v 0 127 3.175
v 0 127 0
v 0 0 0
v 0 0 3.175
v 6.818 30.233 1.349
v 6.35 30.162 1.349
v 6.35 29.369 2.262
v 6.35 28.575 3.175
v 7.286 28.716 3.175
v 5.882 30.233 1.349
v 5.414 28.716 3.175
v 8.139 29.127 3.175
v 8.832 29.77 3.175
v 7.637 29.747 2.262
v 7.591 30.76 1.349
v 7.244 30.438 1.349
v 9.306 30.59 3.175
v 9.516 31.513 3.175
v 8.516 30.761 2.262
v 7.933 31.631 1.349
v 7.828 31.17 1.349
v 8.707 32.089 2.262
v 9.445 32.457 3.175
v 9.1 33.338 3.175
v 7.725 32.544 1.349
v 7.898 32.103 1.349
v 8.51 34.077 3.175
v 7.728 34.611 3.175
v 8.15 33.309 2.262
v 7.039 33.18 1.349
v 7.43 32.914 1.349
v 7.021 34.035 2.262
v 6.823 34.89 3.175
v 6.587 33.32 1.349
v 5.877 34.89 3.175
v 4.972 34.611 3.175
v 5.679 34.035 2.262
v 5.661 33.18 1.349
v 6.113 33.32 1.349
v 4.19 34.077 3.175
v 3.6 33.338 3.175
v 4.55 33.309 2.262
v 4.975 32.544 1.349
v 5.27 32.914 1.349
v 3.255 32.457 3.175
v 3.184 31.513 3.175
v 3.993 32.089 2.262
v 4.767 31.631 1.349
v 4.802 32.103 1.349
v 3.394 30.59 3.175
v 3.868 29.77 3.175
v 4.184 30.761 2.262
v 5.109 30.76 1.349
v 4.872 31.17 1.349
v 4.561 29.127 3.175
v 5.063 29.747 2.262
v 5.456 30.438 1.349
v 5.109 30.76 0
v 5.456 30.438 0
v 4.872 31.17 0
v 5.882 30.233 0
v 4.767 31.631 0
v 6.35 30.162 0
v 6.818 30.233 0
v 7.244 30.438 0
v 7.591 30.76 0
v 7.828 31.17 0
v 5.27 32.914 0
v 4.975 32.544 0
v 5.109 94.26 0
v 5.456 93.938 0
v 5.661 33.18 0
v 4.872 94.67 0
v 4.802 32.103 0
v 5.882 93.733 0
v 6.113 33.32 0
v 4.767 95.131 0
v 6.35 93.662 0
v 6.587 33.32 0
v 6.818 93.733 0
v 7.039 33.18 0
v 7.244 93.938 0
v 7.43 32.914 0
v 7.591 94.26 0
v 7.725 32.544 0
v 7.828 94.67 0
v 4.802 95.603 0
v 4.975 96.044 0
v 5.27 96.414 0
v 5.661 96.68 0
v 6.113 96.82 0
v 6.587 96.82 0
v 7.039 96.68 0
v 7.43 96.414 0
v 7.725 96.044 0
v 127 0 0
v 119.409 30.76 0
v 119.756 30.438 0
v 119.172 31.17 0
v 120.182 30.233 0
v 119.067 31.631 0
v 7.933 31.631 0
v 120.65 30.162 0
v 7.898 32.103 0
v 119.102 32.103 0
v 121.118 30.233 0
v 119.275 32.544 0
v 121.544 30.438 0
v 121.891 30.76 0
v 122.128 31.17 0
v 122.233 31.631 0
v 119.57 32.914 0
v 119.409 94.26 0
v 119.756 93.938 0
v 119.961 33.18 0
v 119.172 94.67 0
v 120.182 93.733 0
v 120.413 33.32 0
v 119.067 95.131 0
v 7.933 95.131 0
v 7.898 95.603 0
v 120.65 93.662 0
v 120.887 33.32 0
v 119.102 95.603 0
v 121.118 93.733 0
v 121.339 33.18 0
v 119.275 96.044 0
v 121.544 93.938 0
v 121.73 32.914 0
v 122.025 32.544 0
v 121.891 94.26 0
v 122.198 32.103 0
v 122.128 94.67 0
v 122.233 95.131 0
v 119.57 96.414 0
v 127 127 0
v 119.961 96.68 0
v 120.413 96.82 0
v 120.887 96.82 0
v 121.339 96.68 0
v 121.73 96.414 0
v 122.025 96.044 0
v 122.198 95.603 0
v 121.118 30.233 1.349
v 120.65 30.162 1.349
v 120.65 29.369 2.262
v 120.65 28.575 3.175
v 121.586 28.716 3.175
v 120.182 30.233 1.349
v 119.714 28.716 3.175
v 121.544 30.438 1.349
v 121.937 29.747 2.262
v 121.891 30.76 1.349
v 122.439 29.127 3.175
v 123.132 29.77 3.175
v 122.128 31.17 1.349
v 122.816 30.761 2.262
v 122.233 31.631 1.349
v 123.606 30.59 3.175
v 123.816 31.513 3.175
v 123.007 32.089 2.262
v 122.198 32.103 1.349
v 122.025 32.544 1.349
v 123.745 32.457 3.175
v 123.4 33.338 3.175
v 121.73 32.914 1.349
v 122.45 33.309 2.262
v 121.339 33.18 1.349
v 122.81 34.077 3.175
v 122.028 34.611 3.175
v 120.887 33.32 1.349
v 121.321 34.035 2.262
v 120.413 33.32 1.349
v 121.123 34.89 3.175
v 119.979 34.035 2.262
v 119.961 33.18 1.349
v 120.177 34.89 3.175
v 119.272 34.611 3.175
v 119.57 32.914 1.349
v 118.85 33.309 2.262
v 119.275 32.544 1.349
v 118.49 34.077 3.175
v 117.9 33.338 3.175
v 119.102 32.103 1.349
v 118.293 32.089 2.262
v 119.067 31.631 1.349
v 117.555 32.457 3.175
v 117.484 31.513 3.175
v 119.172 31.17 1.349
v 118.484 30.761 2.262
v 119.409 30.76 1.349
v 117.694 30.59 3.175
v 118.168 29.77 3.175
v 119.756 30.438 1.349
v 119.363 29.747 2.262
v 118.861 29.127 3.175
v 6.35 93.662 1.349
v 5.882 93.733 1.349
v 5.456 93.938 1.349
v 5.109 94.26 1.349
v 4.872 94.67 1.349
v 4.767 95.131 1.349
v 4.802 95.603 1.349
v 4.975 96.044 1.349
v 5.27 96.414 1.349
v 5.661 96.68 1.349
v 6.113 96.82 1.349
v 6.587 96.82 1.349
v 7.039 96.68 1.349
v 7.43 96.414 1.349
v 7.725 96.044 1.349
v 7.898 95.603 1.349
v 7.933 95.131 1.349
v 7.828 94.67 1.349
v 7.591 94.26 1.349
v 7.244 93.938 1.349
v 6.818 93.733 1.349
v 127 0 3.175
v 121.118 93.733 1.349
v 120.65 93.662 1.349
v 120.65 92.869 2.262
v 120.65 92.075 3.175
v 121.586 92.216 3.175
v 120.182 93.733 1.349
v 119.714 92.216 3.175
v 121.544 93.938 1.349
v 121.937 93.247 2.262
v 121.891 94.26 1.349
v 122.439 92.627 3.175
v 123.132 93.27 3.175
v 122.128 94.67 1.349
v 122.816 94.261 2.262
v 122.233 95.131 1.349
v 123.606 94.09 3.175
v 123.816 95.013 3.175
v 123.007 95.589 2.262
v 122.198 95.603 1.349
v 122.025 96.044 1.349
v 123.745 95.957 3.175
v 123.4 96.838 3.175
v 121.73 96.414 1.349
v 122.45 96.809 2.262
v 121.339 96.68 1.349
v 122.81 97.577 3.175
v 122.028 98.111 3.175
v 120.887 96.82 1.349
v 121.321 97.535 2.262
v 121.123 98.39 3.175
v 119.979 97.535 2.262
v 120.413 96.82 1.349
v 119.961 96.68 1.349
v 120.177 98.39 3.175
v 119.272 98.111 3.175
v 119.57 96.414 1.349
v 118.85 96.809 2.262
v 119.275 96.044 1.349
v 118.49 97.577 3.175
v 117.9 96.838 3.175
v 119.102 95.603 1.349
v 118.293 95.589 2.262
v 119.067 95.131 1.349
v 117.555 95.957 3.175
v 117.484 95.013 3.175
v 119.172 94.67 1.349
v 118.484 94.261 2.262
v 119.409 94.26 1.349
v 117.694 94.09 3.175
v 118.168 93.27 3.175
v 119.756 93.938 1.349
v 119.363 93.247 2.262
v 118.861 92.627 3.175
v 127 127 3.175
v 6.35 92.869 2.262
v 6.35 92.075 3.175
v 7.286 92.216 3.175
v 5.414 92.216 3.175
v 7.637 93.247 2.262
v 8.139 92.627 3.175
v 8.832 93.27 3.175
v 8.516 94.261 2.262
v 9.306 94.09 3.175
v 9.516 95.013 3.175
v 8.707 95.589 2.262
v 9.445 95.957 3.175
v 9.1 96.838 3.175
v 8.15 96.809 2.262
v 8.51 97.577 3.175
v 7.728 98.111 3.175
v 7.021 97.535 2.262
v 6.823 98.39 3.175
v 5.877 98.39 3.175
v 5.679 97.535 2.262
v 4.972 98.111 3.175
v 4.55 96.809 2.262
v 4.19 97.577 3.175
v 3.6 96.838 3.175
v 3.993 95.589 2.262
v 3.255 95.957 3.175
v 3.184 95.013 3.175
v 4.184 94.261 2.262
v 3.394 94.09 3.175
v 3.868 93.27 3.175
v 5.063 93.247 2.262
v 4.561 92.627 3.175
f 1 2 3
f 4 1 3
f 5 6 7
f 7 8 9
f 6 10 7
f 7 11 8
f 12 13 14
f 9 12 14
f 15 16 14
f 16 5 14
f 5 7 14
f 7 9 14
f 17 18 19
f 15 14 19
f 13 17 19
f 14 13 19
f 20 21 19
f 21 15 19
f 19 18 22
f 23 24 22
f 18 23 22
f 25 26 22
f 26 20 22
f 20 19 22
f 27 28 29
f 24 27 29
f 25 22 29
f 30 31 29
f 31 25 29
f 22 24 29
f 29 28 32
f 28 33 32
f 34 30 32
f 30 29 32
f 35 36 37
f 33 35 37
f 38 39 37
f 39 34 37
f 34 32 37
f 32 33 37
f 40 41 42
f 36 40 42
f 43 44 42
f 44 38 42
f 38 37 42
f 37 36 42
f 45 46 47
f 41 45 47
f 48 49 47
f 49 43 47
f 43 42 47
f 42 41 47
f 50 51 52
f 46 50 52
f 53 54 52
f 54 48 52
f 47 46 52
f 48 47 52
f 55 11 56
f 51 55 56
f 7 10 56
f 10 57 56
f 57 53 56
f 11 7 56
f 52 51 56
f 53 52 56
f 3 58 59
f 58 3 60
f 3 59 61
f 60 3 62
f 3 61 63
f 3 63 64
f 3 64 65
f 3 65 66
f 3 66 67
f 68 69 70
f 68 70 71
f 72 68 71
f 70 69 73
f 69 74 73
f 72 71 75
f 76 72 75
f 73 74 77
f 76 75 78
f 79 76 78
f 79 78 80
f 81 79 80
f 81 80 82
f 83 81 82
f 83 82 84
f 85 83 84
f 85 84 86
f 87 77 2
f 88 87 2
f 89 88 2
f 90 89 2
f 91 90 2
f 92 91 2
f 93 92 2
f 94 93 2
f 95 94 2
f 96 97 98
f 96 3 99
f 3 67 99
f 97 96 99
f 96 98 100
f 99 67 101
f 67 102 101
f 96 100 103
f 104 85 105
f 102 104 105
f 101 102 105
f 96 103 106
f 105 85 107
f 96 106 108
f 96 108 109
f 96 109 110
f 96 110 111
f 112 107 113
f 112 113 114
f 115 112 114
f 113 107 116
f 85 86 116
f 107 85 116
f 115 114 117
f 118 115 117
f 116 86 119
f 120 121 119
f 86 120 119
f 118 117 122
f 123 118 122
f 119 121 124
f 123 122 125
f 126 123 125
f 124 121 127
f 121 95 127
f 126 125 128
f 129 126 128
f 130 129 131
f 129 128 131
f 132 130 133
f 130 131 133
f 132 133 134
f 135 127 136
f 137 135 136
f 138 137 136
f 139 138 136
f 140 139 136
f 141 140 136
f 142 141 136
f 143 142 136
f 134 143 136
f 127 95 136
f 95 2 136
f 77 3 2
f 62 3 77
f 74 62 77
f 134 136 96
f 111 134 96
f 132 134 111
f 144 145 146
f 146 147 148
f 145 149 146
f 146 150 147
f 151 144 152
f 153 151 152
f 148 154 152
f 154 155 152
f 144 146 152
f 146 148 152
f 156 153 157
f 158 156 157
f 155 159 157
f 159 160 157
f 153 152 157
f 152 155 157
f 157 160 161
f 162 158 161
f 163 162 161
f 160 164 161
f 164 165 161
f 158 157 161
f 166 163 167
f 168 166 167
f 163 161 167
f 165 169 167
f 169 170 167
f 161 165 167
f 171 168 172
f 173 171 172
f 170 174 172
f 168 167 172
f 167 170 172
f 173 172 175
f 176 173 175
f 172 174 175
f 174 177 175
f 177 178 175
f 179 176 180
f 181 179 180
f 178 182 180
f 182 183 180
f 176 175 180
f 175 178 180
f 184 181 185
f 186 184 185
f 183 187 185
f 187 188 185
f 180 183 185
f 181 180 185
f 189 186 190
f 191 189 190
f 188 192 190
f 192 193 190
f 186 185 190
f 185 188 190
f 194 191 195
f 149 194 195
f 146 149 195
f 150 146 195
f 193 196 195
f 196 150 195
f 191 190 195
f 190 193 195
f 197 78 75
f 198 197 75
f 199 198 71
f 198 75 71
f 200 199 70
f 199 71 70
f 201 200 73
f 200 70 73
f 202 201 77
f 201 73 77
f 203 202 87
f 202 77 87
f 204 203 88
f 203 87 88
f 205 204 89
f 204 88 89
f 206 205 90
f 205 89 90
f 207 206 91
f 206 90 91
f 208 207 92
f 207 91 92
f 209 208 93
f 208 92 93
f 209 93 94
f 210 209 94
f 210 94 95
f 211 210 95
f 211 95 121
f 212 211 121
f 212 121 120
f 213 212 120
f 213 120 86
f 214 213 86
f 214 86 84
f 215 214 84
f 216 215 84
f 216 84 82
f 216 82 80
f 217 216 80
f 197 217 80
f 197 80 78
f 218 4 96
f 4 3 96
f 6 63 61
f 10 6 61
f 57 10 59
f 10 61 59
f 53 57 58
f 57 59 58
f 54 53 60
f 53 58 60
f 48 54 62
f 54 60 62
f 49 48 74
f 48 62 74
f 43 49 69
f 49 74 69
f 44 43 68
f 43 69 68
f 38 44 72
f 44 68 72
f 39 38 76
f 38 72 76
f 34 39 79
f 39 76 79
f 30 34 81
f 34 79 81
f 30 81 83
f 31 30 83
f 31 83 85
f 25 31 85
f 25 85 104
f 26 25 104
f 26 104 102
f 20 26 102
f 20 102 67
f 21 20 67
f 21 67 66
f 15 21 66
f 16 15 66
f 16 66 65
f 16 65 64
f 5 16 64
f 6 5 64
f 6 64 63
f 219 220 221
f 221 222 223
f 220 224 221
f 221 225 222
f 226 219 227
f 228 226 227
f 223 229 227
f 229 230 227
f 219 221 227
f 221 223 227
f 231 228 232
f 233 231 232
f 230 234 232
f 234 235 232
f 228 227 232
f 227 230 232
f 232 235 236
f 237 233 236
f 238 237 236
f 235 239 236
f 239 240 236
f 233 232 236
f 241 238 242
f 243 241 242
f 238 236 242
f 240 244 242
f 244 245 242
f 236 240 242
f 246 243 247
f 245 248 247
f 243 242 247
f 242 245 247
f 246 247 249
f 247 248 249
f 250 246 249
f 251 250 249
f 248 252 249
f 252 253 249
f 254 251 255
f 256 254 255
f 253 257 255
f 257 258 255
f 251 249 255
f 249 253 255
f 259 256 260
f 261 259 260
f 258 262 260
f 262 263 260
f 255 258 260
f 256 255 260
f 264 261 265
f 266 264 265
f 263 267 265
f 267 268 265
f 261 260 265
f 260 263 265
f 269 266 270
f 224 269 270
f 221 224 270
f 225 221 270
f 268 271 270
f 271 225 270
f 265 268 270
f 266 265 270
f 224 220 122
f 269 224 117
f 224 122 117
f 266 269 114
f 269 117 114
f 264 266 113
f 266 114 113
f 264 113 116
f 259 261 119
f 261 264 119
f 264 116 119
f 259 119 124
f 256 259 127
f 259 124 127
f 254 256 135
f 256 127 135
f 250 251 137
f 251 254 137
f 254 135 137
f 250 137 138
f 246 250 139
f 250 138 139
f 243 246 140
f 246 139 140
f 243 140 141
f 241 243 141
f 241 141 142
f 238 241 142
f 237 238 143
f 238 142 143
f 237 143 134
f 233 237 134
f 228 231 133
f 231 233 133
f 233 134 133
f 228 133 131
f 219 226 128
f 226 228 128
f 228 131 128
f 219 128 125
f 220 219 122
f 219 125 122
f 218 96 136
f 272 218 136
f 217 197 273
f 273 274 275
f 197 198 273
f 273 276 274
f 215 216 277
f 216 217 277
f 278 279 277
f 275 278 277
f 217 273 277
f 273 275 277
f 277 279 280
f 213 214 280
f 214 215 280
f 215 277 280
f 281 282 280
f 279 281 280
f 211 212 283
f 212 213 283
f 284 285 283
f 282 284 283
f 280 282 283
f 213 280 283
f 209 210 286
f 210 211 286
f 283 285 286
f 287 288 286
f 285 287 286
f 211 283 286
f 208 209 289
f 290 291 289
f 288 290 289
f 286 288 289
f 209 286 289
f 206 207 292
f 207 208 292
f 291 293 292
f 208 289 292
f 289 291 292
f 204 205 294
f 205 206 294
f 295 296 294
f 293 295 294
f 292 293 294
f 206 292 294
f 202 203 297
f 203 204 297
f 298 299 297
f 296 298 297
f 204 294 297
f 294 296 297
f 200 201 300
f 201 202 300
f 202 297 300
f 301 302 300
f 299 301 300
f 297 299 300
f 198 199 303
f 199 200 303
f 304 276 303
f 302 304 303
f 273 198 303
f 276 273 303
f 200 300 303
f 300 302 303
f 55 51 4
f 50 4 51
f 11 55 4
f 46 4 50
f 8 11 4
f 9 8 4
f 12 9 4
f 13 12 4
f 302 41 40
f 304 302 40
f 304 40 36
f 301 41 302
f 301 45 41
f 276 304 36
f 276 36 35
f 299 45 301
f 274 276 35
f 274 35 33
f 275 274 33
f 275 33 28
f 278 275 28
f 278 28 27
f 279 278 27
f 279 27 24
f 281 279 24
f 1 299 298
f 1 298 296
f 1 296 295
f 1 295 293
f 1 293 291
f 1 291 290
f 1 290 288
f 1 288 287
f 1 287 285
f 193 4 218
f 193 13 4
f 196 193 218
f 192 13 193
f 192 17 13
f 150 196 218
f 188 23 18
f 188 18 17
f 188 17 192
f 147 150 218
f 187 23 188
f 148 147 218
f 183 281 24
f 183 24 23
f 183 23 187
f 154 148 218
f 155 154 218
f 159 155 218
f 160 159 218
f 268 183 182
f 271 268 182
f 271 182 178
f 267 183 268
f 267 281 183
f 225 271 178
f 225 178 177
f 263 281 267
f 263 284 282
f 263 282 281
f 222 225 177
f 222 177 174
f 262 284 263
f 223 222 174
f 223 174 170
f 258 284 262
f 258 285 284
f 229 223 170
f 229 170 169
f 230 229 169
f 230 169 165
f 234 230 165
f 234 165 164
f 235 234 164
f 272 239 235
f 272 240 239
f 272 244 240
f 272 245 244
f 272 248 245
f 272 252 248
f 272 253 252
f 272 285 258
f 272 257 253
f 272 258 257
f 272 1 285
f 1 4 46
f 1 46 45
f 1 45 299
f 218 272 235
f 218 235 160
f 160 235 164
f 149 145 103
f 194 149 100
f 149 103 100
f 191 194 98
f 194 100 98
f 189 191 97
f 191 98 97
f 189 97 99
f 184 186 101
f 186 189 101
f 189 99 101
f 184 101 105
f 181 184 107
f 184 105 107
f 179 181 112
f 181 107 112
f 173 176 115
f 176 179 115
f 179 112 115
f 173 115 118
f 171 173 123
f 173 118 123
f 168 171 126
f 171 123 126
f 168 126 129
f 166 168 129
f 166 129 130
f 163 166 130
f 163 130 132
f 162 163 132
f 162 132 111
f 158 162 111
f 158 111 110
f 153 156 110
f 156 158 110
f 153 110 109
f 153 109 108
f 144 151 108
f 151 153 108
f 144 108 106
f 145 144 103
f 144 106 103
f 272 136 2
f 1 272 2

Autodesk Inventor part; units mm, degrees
ref_plane "YZ Plane" through (0, 0, 0) normal (1, 0, 0) x (0, 1, 0)
ref_plane "XZ Plane" through (0, 0, 0) normal (0, 1, 0) x (-1, 0, 0)
sketch "Sketch1" plane through (0, 0, 0) normal (0, 0, 1) x (1, 0, 0)
  line L0 (0, 0) -> (127, 0)
  line L1 (127, 0) -> (127, 127)
  line L2 (127, 127) -> (0, 127)
  line L3 (0, 127) -> (0, 0)
  dimension "d0" = 127
  dimension "d1" = 127
extrude "Extrusion1" add sketch "Sketch1" along normal blind 3.175
sketch "Sketch2" plane through (0, 0, 3.175) normal (0, 0, 1) x (1, 0, 0)
  line L0 (127, 127) -> (0, 127) construction
  line L1 (0, 127) -> (0, 101.6) construction
  line L2 (0, 127) -> (0, 0) construction
  line L3 (0, 0) -> (127, 0) construction
  line L4 (0, 0) -> (0, 25.4) construction
  line L5 (0, 25.4) -> (6.35, 25.4) construction
  line L6 (6.35, 25.4) -> (6.35, 31.75) construction
  line L7 (6.35, 31.75) -> (0, 31.75) construction
  line L8 (0, 31.75) -> (0, 25.4) construction
  line L9 (0, 101.6) -> (6.35, 101.6) construction
  line L10 (6.35, 101.6) -> (6.35, 95.25) construction
  line L11 (6.35, 95.25) -> (0, 95.25) construction
  line L12 (0, 95.25) -> (0, 101.6) construction
  dimension "d4" = 25.4
  dimension "d5" = 25.4
  dimension "d6" = 6.35
  dimension "d7" = 6.35
  dimension "d8" = 6.35
  dimension "d9" = 6.35
ref_plane "Work Plane1" through (63.5, 0, 0) normal (1, 0, 0) x (0, 0, -1)
hole "Hole1" at (6.35, 95.25, 3.175) at (6.35, 31.75, 3.175) direction (0, 0, -1) diameter 3.175 depth 25.4 tip angle 118 countersink diameter 6.35 countersink angle 82
mirror "Mirror1" about plane through (63.5, 0, 0) normal (1, 0, 0) of "Hole1"
properties part number "wheel coreBack"
